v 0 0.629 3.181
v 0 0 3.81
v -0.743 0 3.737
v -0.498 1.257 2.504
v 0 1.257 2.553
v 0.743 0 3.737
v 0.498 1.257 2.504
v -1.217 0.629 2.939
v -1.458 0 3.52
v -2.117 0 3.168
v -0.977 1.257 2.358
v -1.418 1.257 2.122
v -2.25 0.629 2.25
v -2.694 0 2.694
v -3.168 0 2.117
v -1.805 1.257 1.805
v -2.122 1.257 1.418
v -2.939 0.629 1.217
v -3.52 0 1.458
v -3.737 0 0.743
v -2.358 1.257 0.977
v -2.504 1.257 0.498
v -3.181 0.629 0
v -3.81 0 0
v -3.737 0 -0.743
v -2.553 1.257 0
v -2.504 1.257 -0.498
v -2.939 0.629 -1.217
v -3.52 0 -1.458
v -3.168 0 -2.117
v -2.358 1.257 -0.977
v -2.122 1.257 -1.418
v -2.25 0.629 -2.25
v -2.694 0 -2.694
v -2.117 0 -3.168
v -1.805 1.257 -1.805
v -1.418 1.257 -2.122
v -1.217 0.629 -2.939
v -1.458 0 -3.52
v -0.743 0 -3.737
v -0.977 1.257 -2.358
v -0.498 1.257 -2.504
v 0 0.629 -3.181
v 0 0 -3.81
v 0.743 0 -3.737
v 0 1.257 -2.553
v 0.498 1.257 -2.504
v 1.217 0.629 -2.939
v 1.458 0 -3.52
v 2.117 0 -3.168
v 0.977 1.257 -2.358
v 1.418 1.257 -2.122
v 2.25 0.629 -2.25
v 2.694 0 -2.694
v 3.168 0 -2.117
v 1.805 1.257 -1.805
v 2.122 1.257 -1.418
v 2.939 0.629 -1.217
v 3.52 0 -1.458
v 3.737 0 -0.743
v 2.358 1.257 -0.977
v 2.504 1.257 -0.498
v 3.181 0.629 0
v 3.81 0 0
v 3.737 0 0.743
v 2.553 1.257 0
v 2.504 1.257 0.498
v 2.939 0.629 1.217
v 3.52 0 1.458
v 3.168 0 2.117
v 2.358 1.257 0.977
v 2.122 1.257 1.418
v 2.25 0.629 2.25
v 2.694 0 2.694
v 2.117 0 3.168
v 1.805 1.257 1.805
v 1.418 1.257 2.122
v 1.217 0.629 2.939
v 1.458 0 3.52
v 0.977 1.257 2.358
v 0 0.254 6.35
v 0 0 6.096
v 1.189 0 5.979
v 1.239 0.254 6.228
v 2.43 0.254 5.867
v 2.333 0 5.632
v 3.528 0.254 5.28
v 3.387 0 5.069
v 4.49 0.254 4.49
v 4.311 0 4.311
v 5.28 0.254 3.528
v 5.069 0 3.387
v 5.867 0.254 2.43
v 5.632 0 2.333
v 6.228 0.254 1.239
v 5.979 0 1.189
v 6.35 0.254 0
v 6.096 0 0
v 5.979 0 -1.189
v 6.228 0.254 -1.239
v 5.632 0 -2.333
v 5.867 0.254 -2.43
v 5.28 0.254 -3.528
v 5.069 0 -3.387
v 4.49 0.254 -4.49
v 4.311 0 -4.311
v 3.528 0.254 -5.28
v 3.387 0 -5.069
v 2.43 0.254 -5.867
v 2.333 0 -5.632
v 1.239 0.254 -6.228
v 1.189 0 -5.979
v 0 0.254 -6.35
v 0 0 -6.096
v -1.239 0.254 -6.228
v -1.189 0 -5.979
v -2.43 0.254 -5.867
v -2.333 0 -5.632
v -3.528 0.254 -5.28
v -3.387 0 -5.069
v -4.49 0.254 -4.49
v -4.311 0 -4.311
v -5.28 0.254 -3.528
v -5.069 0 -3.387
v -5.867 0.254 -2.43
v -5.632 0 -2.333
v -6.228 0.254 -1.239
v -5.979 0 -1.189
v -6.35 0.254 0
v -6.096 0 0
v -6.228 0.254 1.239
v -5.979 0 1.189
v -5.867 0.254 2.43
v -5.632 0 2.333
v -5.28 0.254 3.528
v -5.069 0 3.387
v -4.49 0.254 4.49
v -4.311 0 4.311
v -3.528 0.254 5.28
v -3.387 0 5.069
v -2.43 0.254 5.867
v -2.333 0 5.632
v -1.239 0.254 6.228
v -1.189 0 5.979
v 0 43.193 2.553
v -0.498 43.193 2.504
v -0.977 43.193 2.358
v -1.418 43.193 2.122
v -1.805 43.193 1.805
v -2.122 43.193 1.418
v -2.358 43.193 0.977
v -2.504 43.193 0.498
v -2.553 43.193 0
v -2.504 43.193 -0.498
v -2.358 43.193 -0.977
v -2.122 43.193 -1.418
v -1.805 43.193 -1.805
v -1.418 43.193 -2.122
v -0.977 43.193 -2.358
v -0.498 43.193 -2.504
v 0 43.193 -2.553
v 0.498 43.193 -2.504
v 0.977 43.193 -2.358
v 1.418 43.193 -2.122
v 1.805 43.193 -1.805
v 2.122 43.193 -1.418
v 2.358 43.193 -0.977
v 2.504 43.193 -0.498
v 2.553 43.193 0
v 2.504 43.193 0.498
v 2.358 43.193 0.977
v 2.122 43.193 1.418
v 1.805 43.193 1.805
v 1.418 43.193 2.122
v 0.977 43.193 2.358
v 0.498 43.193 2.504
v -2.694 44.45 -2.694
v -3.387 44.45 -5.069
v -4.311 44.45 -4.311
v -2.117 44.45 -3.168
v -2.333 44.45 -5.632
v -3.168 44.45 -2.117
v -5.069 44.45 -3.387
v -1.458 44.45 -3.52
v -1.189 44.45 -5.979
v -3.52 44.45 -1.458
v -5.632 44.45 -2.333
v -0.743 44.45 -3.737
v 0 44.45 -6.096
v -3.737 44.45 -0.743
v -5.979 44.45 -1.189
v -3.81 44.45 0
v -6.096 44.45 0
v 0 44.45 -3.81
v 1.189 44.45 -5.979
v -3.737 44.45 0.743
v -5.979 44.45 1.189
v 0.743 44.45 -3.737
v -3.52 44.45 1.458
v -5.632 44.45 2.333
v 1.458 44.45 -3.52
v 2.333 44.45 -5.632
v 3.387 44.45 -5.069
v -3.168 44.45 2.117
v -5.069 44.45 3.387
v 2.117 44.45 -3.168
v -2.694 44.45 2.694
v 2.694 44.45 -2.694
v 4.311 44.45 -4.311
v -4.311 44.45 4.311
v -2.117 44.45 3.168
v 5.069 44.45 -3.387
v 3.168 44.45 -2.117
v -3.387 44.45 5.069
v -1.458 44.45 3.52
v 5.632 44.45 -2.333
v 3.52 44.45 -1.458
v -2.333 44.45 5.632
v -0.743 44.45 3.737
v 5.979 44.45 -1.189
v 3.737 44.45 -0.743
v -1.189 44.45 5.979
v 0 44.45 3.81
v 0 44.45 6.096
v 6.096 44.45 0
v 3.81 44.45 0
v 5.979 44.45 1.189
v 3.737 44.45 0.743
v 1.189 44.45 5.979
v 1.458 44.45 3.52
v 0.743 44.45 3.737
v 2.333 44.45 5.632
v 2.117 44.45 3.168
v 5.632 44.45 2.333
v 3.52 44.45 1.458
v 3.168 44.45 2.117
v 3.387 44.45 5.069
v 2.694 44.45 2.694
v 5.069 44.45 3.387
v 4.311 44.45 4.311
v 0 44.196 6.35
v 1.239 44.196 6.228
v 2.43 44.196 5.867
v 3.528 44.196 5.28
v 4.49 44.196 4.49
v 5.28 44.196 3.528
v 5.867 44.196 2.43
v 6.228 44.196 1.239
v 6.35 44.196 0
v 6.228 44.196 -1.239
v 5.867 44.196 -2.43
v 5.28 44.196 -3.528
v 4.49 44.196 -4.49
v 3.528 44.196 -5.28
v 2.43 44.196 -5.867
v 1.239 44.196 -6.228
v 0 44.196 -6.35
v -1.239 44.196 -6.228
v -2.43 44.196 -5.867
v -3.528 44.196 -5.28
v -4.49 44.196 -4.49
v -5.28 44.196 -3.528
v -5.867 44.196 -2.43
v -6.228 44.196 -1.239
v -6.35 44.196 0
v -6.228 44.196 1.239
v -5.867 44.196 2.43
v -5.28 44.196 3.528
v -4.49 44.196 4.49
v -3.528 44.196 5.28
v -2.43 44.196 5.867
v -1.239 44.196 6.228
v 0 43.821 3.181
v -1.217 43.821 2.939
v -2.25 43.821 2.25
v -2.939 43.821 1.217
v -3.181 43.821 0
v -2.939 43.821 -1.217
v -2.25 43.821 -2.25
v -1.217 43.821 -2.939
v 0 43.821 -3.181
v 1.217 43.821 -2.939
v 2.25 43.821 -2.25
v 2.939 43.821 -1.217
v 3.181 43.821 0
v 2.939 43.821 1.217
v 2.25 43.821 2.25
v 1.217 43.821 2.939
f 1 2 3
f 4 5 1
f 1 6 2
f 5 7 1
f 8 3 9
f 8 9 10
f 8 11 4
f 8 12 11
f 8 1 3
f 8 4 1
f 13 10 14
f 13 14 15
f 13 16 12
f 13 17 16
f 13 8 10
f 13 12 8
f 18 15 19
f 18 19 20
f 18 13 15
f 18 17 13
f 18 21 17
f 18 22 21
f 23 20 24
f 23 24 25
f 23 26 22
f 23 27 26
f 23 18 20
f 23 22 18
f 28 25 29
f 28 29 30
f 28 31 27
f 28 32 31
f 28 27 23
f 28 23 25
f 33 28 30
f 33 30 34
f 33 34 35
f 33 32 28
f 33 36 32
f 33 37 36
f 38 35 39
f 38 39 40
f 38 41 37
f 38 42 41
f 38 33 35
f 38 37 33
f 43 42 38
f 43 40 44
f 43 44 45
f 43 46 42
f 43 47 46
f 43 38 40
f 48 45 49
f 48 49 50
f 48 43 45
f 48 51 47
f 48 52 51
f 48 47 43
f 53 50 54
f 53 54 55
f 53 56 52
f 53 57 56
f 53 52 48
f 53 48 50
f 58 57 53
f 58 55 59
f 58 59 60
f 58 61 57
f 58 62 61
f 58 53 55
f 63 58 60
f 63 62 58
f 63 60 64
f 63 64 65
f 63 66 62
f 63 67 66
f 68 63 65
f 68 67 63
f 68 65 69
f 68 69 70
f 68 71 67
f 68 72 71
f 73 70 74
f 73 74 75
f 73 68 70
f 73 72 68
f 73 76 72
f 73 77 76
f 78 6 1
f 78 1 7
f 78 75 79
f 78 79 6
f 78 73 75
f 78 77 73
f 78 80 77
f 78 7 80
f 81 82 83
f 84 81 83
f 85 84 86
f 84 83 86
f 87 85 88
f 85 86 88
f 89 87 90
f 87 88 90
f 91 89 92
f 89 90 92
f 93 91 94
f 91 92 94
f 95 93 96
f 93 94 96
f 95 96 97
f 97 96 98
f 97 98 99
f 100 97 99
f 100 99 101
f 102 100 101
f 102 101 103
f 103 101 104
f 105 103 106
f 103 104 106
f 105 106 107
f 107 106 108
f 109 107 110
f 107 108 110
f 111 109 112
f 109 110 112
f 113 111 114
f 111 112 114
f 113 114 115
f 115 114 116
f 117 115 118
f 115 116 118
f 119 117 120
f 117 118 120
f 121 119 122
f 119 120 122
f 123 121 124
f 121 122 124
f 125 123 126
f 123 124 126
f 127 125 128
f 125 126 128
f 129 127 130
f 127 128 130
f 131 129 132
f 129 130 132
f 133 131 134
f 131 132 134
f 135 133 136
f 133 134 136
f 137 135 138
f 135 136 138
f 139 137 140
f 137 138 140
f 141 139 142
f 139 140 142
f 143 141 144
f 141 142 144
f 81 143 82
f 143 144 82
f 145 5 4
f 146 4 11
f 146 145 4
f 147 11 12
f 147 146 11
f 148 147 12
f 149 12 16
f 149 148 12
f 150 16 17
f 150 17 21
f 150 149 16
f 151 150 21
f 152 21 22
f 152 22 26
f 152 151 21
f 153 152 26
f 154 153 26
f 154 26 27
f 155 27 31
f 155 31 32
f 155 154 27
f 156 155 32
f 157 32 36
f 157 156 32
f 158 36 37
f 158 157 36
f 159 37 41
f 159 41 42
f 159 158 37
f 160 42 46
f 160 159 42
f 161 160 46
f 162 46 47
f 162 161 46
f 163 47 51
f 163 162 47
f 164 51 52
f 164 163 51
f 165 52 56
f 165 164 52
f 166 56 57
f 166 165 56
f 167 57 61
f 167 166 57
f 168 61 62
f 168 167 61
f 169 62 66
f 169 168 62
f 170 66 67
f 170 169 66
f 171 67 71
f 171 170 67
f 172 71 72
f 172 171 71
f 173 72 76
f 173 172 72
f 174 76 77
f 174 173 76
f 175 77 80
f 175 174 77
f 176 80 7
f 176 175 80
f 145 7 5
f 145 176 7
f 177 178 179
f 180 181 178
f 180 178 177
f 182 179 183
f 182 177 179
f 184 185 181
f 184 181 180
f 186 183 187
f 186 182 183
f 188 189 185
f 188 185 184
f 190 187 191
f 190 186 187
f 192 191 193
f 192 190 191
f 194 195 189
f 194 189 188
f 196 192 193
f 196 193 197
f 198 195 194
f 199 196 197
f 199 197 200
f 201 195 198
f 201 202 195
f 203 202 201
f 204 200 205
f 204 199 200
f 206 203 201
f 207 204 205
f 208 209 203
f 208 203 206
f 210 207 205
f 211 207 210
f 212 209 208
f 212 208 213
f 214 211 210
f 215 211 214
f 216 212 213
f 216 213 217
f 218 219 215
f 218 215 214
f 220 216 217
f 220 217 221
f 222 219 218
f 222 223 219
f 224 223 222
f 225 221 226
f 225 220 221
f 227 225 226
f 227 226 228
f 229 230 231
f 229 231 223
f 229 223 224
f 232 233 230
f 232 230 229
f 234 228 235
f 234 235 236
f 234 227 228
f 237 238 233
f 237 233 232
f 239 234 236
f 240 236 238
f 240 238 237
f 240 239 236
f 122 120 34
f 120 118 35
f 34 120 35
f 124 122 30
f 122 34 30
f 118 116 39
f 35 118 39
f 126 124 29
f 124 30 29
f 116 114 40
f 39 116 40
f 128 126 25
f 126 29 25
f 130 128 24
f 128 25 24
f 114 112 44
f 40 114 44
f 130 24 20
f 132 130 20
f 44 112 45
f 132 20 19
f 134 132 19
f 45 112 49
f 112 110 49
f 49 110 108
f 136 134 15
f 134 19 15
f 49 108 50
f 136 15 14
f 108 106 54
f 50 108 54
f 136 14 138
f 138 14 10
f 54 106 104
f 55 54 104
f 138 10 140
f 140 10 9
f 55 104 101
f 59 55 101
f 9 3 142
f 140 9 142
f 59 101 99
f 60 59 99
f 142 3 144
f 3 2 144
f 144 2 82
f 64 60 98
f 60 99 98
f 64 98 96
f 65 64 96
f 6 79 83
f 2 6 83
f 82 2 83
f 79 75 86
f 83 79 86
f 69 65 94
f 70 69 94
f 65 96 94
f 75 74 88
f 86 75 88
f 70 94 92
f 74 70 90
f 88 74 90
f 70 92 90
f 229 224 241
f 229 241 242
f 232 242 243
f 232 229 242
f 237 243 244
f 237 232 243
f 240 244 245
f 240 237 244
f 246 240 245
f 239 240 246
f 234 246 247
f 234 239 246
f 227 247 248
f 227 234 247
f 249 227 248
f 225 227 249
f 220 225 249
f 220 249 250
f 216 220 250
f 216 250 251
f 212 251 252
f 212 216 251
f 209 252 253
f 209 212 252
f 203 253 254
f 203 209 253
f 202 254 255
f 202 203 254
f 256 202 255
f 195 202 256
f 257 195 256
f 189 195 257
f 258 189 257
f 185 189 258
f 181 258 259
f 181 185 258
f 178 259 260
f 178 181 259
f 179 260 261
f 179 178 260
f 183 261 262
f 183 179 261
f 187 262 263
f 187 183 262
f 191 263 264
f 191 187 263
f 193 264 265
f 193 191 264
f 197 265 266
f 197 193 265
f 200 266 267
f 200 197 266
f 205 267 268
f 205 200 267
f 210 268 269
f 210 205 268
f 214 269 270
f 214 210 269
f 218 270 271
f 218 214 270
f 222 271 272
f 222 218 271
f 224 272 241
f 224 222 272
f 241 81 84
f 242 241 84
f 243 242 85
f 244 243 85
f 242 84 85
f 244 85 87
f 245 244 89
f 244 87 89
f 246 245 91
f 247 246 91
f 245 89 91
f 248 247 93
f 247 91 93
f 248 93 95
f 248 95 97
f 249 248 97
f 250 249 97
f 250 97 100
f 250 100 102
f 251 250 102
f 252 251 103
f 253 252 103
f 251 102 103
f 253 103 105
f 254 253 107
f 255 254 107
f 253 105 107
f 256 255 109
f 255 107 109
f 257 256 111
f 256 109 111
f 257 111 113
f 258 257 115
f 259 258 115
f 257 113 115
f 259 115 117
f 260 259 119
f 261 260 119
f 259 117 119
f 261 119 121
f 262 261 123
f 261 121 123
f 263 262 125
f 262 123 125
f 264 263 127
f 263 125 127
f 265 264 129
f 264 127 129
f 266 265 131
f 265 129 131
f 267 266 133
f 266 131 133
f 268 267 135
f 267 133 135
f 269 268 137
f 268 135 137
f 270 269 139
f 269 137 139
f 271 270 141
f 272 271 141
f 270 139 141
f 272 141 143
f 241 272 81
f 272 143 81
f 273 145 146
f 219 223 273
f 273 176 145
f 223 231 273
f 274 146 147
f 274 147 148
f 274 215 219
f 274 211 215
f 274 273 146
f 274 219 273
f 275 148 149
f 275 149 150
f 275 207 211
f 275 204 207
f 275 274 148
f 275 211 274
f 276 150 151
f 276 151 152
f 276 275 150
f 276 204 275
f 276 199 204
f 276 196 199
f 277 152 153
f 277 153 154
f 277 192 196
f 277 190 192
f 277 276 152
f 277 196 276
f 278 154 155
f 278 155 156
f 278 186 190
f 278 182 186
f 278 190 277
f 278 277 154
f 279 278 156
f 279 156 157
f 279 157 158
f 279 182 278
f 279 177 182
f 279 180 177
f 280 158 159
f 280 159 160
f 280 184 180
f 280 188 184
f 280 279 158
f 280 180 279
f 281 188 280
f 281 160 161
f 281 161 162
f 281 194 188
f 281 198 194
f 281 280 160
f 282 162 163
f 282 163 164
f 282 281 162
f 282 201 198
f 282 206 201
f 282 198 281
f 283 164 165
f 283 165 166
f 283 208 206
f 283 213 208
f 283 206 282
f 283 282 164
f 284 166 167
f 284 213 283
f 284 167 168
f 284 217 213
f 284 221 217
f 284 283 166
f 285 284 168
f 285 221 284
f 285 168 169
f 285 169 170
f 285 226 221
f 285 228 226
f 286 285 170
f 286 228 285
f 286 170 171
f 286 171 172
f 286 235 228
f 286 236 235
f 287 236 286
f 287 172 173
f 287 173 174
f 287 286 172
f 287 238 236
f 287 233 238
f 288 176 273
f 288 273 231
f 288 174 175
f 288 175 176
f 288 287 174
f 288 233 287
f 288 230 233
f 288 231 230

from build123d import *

# Parameters (mm, degrees)
SKETCH1_R           = 6.35
BOSS_EXTRUDE1_DEPTH = 44.45
CHAMFER1_SIZE       = 0.254


with BuildPart() as part:
    # Sketch1 → Boss-Extrude1 (new body)
    with BuildSketch(Plane(origin=(0, 0, 0), x_dir=(1, 0, 0), z_dir=(0, 1, 0))):
        with Locations(Location((0, 0, 0), (0, 0, 270))):
            Circle(SKETCH1_R)
    extrude(amount=BOSS_EXTRUDE1_DEPTH)

    # Sketch3 → 1/4-20 Tapped Hole1 (revolve, cut)
    with BuildSketch(Plane(origin=(0, 44.45, 0), x_dir=(0, 0, 1), z_dir=(1, 0, 0))):
        Polygon((0, 0), (0, 44.45), (3.81, 44.45), (2.5527, 43.1927), (2.5527, 1.2573), (3.81, 0), align=None)
    revolve(axis=Axis((0, 50.8, 0), (0, -1, 0)), mode=Mode.SUBTRACT)

    # Chamfer1
    chamfer1_edges = [part.edges().sort_by_distance(p)[0] for p in [
        (0, 0, -6.35),
        (0, 44.45, -6.35),
    ]]
    chamfer(chamfer1_edges, length=CHAMFER1_SIZE)


solid = part.part
